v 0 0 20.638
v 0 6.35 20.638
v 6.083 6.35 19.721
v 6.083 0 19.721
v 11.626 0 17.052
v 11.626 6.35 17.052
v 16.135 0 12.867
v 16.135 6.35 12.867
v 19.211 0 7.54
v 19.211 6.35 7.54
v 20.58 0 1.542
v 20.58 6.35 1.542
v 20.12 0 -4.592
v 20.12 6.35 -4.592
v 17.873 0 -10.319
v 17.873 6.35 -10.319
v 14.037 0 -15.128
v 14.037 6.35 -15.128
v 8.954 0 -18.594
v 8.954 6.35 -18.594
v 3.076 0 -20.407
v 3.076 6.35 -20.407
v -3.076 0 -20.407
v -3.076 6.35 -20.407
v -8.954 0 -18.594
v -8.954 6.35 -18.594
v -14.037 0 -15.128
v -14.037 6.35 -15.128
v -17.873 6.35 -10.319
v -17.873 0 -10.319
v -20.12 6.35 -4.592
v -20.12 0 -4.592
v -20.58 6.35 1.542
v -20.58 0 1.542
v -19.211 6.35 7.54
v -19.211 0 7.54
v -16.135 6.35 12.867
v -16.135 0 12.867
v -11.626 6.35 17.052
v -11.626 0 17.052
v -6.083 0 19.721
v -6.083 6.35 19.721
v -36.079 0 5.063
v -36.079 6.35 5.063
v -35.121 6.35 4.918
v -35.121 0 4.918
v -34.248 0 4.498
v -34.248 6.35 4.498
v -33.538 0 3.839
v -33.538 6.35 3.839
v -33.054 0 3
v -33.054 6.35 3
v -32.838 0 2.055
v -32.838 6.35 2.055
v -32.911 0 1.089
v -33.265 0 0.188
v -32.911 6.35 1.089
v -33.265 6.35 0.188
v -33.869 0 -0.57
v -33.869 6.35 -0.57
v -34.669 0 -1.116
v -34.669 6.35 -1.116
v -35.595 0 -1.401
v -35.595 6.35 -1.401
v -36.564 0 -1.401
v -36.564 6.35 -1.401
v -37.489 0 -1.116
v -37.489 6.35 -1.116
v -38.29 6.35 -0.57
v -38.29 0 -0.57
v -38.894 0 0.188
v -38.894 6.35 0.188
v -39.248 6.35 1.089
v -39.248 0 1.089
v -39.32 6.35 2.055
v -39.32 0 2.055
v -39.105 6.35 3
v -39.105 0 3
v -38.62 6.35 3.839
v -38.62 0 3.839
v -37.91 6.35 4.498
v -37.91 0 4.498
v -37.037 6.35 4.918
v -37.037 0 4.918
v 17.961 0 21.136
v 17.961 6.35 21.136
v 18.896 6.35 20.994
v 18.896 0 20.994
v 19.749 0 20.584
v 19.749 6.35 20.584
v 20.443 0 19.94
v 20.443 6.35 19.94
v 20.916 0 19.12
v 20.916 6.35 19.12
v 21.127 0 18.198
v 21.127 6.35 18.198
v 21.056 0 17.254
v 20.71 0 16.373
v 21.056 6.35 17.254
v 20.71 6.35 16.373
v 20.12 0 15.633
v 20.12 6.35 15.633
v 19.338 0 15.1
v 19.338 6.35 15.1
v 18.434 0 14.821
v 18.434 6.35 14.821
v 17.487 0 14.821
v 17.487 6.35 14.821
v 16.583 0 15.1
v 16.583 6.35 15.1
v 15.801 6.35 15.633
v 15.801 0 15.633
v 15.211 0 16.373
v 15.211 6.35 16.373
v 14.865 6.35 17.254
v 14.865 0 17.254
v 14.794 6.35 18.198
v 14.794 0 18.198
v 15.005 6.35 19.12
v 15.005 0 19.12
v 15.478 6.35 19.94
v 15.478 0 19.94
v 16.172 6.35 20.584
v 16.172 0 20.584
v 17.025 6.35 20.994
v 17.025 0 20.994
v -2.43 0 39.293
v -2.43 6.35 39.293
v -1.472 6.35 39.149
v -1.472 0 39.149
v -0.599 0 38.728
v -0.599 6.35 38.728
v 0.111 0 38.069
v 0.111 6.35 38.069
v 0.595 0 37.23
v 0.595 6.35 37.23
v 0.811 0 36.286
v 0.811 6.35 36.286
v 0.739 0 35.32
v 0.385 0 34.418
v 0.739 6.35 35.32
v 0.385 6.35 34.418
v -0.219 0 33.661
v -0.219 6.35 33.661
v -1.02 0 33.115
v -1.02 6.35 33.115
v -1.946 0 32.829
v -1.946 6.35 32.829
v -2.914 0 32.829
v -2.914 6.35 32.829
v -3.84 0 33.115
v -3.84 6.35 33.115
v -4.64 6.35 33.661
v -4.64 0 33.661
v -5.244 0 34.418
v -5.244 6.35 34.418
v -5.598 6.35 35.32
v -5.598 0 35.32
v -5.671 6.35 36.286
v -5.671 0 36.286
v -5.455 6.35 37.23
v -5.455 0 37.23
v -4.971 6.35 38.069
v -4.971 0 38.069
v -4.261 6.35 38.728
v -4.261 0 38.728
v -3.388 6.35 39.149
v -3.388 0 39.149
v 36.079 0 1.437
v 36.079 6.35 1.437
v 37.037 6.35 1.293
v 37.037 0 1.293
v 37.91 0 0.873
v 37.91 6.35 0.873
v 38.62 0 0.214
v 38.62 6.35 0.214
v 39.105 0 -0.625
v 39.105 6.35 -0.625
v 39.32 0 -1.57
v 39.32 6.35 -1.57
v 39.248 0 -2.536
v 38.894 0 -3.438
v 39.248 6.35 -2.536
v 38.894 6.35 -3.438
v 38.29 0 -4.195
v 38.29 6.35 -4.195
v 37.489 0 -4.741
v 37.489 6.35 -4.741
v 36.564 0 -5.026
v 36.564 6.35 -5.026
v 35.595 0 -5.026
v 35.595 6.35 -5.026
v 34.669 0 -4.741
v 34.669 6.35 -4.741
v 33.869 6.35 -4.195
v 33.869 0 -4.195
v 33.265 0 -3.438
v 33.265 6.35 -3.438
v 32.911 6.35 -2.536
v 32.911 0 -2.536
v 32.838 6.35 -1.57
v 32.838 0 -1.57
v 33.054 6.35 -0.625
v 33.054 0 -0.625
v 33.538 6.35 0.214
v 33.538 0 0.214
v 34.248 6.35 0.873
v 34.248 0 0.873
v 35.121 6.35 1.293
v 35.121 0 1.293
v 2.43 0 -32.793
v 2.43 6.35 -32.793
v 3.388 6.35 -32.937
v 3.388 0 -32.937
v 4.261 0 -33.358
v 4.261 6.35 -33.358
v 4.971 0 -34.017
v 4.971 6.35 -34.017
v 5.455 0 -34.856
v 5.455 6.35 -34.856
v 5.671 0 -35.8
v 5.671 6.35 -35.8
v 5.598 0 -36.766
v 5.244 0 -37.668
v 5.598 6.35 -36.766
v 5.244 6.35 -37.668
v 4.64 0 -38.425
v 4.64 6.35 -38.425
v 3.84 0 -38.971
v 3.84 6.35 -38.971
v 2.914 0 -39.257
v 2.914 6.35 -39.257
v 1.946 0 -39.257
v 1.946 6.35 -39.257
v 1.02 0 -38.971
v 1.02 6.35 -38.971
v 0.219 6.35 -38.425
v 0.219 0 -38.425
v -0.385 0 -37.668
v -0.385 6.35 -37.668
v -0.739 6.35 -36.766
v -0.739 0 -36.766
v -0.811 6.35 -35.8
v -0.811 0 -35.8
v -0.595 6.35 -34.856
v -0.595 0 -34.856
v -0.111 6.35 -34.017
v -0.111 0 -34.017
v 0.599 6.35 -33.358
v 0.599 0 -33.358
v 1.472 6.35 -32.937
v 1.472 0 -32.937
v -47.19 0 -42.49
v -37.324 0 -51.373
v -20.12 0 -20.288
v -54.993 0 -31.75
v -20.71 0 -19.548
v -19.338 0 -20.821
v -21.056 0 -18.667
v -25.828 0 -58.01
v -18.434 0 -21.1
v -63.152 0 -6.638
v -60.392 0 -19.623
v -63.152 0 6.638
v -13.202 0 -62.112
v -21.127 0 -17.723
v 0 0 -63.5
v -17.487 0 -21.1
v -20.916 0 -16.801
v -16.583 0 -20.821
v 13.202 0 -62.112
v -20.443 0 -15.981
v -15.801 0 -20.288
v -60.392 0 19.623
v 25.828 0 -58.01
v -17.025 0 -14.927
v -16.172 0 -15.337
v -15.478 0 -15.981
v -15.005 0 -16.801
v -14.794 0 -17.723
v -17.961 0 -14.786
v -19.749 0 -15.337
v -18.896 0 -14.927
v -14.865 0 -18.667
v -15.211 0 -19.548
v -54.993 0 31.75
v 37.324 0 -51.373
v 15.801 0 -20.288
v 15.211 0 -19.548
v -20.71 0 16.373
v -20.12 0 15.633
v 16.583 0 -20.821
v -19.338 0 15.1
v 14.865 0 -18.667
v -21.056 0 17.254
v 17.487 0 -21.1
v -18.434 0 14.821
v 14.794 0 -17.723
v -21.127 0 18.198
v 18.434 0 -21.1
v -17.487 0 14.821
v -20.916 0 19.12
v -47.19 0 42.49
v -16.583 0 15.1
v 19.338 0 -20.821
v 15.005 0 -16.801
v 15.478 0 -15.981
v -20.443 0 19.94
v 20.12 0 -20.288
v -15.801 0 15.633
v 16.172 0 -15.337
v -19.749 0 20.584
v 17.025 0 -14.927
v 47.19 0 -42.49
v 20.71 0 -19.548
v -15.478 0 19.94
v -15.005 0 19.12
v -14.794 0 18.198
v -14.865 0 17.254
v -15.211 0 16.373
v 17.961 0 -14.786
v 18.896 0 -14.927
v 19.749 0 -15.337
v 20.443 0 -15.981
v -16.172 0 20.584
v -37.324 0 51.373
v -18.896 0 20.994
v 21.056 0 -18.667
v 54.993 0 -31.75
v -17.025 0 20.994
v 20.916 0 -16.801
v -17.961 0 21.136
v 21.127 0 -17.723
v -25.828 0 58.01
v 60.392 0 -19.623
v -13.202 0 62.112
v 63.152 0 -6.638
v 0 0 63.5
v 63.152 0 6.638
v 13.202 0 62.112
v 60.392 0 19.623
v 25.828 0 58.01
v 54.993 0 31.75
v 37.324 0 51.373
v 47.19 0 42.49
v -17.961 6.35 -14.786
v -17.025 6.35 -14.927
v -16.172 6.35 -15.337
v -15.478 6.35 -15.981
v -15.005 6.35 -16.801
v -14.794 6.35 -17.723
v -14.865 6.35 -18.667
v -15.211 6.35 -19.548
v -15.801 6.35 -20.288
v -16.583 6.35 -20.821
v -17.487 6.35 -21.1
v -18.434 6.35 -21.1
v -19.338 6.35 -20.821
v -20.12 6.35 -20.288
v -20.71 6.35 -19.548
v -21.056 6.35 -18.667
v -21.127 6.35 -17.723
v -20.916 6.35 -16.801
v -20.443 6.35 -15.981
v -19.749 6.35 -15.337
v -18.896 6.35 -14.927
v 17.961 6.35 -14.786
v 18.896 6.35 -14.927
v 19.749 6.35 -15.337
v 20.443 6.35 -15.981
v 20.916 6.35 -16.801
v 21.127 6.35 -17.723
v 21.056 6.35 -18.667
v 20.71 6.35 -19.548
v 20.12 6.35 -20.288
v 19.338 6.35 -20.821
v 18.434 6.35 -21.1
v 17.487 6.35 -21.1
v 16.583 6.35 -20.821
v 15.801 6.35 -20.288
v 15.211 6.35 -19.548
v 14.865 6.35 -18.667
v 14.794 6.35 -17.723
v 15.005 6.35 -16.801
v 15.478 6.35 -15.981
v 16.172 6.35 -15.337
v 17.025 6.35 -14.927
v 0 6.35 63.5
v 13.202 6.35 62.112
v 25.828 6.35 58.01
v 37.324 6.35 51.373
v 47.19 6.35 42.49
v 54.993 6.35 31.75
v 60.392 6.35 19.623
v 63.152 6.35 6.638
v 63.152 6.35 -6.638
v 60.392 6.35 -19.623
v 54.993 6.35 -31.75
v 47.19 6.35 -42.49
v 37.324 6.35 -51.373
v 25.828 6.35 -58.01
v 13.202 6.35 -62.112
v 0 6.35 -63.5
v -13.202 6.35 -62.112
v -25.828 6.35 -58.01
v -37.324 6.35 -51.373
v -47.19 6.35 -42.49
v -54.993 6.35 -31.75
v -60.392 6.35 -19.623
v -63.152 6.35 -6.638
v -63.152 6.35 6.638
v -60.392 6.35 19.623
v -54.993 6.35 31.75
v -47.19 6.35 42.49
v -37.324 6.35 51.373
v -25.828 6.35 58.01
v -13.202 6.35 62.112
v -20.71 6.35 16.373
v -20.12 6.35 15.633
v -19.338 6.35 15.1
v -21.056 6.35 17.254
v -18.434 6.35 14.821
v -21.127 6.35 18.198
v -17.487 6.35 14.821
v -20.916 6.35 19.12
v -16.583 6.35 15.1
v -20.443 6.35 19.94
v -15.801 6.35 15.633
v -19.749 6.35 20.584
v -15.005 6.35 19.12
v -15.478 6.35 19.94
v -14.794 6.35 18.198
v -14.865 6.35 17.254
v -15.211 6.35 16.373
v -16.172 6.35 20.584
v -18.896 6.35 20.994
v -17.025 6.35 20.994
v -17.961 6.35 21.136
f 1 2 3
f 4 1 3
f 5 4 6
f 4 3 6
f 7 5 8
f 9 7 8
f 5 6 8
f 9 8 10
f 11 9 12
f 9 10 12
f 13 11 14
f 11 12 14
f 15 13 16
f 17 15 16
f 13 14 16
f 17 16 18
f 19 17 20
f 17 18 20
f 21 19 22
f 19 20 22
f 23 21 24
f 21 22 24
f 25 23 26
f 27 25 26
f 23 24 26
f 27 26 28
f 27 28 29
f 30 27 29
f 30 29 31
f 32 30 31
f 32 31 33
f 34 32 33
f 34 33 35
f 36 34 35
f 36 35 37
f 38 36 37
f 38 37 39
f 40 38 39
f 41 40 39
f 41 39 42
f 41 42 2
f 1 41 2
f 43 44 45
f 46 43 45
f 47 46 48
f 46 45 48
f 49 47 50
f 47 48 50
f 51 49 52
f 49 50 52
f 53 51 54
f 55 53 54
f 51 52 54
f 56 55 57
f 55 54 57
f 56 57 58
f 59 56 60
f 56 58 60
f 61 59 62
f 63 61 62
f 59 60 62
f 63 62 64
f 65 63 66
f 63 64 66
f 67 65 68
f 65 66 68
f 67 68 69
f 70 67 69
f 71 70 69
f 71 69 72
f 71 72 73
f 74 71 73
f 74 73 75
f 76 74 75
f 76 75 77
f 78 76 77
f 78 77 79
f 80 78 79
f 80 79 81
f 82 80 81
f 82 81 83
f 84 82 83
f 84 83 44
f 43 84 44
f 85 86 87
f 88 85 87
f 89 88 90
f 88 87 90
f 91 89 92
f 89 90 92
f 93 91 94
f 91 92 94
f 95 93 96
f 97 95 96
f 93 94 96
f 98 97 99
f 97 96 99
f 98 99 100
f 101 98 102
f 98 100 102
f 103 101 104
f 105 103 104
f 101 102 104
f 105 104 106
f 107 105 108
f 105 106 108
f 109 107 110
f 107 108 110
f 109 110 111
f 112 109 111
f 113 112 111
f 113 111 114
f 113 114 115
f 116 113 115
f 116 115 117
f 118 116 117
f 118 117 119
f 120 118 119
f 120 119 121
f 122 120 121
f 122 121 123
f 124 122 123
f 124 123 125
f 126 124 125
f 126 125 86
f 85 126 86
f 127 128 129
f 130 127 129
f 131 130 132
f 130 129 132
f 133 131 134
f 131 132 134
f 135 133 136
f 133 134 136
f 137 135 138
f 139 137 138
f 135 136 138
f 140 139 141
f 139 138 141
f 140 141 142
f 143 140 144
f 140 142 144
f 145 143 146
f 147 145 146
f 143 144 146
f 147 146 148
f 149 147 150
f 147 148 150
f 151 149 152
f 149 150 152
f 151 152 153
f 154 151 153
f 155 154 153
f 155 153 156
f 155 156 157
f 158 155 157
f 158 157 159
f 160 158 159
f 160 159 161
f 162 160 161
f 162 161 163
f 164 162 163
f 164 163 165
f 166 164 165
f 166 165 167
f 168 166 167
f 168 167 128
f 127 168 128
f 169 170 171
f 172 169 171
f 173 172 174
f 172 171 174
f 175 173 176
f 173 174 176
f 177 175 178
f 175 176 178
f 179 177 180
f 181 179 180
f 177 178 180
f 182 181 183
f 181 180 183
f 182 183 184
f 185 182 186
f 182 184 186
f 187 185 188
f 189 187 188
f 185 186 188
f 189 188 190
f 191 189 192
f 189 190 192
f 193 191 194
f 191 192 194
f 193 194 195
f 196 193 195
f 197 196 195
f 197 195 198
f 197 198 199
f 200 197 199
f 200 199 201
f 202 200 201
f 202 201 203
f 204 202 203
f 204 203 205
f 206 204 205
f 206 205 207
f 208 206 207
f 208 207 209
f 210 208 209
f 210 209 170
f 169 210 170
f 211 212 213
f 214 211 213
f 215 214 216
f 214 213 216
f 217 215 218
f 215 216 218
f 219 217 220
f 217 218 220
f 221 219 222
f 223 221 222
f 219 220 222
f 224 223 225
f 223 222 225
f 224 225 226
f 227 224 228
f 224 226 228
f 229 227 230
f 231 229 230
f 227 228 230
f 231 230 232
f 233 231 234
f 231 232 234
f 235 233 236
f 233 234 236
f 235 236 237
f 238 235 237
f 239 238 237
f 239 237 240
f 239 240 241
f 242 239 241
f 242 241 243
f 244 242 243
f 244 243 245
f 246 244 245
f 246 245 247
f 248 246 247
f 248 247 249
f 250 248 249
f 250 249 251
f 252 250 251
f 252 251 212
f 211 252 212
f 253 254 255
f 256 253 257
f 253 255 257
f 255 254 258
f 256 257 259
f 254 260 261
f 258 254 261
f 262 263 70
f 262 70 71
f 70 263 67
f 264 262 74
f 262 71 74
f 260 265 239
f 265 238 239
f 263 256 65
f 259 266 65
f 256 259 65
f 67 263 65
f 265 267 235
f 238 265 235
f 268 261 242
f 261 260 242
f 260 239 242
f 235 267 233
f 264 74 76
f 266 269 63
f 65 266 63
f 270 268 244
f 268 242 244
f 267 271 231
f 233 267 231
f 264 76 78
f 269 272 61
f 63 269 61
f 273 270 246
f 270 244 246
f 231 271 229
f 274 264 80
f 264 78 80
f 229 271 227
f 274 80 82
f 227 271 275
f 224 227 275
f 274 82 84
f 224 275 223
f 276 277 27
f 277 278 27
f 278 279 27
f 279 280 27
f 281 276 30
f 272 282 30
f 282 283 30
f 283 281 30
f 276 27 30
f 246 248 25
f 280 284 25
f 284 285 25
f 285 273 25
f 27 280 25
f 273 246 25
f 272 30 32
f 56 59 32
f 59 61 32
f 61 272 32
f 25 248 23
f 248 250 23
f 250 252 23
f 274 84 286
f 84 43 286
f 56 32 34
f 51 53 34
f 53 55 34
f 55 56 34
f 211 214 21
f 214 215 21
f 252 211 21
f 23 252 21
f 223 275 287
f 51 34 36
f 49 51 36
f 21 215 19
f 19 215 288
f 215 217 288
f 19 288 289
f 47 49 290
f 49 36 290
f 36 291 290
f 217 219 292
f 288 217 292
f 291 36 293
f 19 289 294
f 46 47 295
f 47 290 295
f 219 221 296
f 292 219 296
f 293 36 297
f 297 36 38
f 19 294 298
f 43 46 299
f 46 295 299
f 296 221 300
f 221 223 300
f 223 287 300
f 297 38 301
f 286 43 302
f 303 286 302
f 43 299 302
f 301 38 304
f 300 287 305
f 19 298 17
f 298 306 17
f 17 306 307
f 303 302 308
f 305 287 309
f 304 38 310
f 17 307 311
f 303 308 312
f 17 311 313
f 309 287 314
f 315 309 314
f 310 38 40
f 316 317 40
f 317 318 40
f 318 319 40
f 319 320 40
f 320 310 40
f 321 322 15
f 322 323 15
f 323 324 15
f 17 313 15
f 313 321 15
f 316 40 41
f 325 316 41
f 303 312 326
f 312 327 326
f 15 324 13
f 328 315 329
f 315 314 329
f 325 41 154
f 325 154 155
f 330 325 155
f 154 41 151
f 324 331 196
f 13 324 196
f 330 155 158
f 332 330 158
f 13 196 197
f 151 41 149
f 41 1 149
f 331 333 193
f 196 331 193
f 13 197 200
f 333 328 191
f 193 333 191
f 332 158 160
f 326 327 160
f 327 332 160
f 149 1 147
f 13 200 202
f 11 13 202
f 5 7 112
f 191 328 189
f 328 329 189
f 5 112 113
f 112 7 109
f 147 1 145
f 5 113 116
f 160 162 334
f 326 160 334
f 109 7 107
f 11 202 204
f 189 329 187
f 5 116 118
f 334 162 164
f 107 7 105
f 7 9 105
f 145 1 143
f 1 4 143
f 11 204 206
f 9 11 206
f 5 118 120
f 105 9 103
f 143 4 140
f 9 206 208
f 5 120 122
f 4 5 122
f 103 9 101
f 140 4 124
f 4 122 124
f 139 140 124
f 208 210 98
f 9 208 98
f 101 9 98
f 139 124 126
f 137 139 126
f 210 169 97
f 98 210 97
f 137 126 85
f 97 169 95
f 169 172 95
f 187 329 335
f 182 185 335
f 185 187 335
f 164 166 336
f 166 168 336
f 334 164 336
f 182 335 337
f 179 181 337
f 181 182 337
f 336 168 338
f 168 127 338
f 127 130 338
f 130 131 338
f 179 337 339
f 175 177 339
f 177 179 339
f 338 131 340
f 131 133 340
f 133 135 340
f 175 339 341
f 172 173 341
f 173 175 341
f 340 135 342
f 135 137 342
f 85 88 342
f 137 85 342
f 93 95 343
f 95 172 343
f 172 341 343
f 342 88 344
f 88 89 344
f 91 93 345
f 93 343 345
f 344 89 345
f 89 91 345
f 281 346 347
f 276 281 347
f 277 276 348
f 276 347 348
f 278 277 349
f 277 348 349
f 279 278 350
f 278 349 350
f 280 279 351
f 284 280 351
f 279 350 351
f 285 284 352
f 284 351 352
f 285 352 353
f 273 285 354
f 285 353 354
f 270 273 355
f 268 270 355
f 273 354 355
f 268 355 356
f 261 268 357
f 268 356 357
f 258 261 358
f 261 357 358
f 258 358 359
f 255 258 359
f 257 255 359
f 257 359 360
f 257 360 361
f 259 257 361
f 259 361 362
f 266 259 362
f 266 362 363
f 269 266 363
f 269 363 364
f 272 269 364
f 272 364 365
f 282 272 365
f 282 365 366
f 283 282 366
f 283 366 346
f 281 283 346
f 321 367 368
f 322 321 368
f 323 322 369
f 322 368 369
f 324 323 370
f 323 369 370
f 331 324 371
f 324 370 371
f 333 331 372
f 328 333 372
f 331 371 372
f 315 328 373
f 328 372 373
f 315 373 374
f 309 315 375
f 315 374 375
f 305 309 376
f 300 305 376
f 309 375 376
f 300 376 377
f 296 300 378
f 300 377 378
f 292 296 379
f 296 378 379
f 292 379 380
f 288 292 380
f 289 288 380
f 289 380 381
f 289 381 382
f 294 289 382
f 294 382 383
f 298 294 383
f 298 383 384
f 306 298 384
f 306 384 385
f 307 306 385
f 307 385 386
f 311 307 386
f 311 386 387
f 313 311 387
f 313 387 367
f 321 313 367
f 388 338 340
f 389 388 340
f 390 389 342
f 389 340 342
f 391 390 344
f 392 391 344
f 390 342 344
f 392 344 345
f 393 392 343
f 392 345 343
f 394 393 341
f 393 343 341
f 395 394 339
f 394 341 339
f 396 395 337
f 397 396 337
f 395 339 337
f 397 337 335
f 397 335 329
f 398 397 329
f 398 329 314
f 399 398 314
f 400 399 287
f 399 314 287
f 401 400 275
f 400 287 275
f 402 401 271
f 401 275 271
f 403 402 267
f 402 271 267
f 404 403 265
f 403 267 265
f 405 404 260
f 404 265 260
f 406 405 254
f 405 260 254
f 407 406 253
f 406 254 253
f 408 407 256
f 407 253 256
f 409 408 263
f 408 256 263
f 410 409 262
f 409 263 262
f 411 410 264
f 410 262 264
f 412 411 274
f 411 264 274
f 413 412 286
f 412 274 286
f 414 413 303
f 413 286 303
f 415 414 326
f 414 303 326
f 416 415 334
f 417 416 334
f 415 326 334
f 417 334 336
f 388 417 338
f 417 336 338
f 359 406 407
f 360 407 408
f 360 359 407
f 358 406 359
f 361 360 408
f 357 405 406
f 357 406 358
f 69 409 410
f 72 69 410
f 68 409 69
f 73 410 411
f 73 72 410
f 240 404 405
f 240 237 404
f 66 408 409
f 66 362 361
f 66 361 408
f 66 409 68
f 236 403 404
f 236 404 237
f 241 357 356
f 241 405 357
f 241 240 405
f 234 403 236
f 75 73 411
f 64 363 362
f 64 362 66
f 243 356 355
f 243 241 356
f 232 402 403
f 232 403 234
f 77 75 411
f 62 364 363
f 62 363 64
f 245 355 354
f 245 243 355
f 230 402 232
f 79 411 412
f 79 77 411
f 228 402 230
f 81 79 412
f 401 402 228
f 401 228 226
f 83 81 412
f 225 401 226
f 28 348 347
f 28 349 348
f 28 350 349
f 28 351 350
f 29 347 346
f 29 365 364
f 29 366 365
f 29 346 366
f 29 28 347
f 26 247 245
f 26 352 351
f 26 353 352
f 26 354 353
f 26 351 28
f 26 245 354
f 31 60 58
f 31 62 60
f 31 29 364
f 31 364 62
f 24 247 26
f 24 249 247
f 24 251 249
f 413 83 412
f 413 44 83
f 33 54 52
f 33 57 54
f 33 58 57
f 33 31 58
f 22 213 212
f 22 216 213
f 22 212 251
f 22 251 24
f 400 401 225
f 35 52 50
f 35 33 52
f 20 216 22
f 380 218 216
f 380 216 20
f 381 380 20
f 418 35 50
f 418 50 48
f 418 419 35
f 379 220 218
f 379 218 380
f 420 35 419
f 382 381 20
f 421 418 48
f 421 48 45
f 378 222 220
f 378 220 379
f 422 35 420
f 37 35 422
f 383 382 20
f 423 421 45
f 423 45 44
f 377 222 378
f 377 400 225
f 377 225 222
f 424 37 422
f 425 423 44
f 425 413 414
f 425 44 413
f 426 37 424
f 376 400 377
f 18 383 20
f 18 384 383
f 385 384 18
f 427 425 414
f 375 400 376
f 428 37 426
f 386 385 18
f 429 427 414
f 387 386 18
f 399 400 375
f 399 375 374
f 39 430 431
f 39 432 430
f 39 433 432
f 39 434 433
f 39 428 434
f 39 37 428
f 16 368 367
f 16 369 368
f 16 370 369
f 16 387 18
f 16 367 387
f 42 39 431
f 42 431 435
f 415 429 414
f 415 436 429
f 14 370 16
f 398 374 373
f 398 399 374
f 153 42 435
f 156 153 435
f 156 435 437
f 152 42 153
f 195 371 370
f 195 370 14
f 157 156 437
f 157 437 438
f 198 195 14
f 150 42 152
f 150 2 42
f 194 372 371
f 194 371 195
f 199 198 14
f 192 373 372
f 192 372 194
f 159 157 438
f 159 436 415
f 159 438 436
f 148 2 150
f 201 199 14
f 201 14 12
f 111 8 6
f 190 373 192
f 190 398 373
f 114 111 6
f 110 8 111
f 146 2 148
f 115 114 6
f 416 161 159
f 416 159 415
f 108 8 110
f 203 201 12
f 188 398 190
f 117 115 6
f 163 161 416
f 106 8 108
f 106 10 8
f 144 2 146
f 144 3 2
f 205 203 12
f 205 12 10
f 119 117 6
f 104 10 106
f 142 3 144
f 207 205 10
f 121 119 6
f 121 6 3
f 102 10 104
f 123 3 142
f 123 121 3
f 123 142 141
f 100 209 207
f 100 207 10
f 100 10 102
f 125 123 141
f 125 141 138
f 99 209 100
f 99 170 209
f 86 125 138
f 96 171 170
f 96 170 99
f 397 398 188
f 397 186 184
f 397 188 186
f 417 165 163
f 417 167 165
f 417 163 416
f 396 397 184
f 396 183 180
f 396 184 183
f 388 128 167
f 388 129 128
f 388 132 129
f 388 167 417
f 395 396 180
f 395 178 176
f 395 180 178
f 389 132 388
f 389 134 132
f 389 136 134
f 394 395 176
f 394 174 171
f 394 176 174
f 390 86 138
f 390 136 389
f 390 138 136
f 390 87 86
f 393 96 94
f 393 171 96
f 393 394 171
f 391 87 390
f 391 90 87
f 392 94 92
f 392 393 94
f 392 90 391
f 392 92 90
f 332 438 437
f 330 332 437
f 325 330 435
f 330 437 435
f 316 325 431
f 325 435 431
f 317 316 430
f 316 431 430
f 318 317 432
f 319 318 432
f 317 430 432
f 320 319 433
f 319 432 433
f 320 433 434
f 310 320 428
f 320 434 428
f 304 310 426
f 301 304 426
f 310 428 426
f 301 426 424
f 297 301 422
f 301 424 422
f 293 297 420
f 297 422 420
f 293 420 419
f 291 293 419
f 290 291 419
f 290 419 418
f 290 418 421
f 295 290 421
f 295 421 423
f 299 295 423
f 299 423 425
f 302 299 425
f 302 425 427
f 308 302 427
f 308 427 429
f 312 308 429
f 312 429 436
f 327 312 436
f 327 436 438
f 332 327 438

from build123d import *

# Parameters (mm, degrees)
SKETCH1_R           = 63.5
BOSS_EXTRUDE1_DEPTH = 6.35
SKETCH2_R           = 20.6375
CUT_EXTRUDE1_DEPTH  = 91.02678768
SKETCH3_R           = 3.175
CUT_EXTRUDE2_DEPTH  = 91.02678768
SKETCH4_R           = 3.25
CUT_EXTRUDE3_DEPTH  = 91.02678768


with BuildPart() as part:
    # Sketch1 → Boss-Extrude1 (new body)
    with BuildSketch(Plane(origin=(0, 0, 0), x_dir=(1, 0, 0), z_dir=(0, 1, 0))):
        with Locations(Location((0, 0, 0), (0, 0, 270))):
            Circle(SKETCH1_R)
    extrude(amount=BOSS_EXTRUDE1_DEPTH)

    # Sketch2 → Cut-Extrude1 (cut, through all)
    with BuildSketch(Plane(origin=(0, 6.35, 0), x_dir=(1, 0, 0), z_dir=(0, 1, 0))):
        with Locations(Location((0, 0, 0), (0, 0, 270))):
            Circle(SKETCH2_R)
    extrude(amount=-CUT_EXTRUDE1_DEPTH, mode=Mode.SUBTRACT)

    # Sketch3 → Cut-Extrude2 (cut, through all)
    with BuildSketch(Plane(origin=(0, 6.35, 0), x_dir=(1, 0, 0), z_dir=(0, 1, 0))):
        with Locations(Location((-17.960512242, 17.960512242, 0), (0, 0, 270))):
            Circle(SKETCH3_R)
        with Locations(Location((17.960512242, 17.960512242, 0), (0, 0, 270))):
            Circle(SKETCH3_R)
        with Locations(Location((17.960512242, -17.960512242, 0), (0, 0, 270))):
            Circle(SKETCH3_R)
        with Locations(Location((-17.960512242, -17.960512242, 0), (0, 0, 270))):
            Circle(SKETCH3_R)
    extrude(amount=-CUT_EXTRUDE2_DEPTH, mode=Mode.SUBTRACT)

    # Sketch4 → Cut-Extrude3 (cut, through all)
    with BuildSketch(Plane(origin=(0, 6.35, 0), x_dir=(1, 0, 0), z_dir=(0, 1, 0))):
        with Locations(Location((-36.079282025, -1.812569594, 0), (0, 0, 270))):
            Circle(SKETCH4_R)
        with Locations(Location((2.429915675, 36.04296755, 0), (0, 0, 270))):
            Circle(SKETCH4_R)
        with Locations(Location((36.079282025, 1.812569594, 0), (0, 0, 270))):
            Circle(SKETCH4_R)
        with Locations(Location((-2.429915675, -36.04296755, 0), (0, 0, 270))):
            Circle(SKETCH4_R)
    extrude(amount=-CUT_EXTRUDE3_DEPTH, mode=Mode.SUBTRACT)


solid = part.part
